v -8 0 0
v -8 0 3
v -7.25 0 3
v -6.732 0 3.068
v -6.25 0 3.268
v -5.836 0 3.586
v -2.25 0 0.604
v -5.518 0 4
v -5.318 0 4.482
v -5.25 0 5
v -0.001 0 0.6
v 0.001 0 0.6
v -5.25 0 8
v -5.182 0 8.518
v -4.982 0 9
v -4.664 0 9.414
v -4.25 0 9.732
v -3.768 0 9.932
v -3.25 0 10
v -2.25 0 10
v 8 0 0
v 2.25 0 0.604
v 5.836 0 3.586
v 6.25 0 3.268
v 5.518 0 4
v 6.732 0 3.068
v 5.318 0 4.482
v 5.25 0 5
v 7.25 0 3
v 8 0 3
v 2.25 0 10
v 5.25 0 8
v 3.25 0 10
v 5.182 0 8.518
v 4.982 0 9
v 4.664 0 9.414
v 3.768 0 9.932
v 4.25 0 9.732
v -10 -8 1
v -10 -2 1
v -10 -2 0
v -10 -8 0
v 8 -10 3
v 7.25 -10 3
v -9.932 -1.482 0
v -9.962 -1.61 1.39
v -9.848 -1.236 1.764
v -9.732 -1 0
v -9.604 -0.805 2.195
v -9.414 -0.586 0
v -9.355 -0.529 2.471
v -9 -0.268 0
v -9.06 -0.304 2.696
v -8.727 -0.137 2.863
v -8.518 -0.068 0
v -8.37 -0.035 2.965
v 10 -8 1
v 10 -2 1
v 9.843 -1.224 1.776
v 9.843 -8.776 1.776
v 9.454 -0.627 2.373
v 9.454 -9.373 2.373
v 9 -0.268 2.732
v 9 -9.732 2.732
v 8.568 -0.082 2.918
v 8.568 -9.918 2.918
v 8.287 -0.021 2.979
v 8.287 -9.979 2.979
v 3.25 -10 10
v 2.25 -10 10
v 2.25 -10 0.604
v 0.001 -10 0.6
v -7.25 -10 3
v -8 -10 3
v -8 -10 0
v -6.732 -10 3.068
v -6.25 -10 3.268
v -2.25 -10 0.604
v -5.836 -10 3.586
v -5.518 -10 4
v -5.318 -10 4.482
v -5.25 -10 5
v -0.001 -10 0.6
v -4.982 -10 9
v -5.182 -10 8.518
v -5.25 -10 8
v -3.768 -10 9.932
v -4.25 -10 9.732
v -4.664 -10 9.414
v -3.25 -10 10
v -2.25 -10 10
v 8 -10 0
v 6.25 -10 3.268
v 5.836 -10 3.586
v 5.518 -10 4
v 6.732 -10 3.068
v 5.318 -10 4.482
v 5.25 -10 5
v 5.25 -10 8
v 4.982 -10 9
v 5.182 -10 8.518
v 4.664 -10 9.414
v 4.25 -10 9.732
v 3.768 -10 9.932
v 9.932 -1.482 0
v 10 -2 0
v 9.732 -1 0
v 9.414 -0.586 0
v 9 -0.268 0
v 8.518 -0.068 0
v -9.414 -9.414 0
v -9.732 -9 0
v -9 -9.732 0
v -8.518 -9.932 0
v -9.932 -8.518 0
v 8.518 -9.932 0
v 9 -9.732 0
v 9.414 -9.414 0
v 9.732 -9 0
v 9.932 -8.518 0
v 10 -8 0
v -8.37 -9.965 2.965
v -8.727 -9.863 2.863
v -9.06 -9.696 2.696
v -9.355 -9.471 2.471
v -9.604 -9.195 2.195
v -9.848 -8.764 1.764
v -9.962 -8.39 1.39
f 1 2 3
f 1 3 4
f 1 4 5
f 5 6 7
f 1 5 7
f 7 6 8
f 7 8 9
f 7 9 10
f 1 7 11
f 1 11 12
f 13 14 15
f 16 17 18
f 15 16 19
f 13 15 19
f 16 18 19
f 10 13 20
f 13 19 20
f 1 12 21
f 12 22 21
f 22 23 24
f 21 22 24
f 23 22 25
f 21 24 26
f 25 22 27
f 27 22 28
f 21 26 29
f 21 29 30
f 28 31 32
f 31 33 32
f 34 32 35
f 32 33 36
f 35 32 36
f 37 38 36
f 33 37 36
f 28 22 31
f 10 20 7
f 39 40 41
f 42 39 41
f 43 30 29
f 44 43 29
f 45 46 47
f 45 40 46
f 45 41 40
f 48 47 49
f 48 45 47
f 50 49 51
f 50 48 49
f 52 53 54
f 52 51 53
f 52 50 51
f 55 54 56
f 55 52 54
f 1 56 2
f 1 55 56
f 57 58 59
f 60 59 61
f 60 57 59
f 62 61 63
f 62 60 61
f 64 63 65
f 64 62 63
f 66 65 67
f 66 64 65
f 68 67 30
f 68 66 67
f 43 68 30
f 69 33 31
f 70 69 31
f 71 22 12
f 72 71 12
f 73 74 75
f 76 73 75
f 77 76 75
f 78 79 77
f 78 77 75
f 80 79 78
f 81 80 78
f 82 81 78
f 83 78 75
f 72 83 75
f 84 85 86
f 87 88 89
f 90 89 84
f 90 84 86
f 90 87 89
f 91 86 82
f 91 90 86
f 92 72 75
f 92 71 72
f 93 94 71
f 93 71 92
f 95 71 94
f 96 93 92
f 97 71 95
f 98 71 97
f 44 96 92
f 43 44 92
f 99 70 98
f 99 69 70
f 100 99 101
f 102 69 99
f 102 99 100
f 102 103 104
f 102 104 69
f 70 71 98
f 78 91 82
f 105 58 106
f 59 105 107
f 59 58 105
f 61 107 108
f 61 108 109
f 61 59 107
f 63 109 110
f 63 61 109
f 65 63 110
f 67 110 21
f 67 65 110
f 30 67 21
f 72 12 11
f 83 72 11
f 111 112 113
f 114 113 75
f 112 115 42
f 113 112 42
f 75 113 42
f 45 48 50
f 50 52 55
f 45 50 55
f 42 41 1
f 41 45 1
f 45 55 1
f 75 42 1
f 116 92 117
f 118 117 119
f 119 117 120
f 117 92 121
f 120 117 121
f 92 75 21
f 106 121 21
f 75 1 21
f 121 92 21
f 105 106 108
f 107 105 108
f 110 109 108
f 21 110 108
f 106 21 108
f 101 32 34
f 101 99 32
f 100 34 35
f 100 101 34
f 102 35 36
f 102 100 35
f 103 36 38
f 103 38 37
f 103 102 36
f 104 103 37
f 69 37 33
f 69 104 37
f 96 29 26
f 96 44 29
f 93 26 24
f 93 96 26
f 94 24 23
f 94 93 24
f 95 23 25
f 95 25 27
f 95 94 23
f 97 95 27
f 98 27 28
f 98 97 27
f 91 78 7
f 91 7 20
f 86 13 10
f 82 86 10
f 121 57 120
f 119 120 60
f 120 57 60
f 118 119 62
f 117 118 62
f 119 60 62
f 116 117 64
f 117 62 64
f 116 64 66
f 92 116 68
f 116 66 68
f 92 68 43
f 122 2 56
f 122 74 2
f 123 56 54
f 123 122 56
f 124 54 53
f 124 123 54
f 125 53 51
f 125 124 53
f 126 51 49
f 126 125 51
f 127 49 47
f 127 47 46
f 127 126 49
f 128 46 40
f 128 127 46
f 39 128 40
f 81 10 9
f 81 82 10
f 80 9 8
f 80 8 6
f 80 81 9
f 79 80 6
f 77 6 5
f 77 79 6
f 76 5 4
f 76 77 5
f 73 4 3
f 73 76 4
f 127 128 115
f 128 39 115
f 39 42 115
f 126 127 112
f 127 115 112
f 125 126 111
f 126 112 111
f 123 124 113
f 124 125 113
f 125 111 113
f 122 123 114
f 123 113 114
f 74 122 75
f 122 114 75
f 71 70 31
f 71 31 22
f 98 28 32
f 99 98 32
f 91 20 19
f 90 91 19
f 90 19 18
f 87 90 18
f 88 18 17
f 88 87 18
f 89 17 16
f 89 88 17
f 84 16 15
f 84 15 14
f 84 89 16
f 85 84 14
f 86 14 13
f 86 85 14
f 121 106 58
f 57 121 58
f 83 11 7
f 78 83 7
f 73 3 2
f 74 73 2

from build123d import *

# Parameters (mm, degrees)
F1_DEPTH = 10
F2_R     = 2


# Not quite as in the source:
# - ends of sketch curves that miss each other by under 0.0002 mm in the source are joined


with BuildPart() as f1:
    # F0 (on Front) → F1 (new body)
    with BuildSketch(Plane.XZ):
        Polygon((-0.0010415313, 0.600002712), (-2.25, 0.6039066758), (-2.25, 10), (-5.25, 10), (-5.25, 3), (-10, 3), (-10, 0), (0, 0), align=None)
        Polygon((0.0010415376, 0.599999096), (-0.0010415313, 0.600002712), (0, 0), align=None)
        Polygon((2.25, 0.6039066758), (0.0010415313, 0.600002712), (0, 0), (10, 0), (10, 3), (5.25, 3), (5.25, 10), (2.25, 10), align=None)
    extrude(amount=F1_DEPTH)

    # F2
    f2_edges = [f1.edges().sort_by_distance(p)[0] for p in [
        (-5.25, -5, 3),
        (5.25, -5, 3),
        (10, -5, 3),
        (5.25, -5, 10),
        (-5.25, -5, 10),
        (-10, -5, 3),
        (-10, -10, 1.5),
        (-10, 0, 1.5),
        (10, -10, 1.5),
        (10, 0, 1.5),
    ]]
    fillet(f2_edges, radius=F2_R)


solid = f1.part
